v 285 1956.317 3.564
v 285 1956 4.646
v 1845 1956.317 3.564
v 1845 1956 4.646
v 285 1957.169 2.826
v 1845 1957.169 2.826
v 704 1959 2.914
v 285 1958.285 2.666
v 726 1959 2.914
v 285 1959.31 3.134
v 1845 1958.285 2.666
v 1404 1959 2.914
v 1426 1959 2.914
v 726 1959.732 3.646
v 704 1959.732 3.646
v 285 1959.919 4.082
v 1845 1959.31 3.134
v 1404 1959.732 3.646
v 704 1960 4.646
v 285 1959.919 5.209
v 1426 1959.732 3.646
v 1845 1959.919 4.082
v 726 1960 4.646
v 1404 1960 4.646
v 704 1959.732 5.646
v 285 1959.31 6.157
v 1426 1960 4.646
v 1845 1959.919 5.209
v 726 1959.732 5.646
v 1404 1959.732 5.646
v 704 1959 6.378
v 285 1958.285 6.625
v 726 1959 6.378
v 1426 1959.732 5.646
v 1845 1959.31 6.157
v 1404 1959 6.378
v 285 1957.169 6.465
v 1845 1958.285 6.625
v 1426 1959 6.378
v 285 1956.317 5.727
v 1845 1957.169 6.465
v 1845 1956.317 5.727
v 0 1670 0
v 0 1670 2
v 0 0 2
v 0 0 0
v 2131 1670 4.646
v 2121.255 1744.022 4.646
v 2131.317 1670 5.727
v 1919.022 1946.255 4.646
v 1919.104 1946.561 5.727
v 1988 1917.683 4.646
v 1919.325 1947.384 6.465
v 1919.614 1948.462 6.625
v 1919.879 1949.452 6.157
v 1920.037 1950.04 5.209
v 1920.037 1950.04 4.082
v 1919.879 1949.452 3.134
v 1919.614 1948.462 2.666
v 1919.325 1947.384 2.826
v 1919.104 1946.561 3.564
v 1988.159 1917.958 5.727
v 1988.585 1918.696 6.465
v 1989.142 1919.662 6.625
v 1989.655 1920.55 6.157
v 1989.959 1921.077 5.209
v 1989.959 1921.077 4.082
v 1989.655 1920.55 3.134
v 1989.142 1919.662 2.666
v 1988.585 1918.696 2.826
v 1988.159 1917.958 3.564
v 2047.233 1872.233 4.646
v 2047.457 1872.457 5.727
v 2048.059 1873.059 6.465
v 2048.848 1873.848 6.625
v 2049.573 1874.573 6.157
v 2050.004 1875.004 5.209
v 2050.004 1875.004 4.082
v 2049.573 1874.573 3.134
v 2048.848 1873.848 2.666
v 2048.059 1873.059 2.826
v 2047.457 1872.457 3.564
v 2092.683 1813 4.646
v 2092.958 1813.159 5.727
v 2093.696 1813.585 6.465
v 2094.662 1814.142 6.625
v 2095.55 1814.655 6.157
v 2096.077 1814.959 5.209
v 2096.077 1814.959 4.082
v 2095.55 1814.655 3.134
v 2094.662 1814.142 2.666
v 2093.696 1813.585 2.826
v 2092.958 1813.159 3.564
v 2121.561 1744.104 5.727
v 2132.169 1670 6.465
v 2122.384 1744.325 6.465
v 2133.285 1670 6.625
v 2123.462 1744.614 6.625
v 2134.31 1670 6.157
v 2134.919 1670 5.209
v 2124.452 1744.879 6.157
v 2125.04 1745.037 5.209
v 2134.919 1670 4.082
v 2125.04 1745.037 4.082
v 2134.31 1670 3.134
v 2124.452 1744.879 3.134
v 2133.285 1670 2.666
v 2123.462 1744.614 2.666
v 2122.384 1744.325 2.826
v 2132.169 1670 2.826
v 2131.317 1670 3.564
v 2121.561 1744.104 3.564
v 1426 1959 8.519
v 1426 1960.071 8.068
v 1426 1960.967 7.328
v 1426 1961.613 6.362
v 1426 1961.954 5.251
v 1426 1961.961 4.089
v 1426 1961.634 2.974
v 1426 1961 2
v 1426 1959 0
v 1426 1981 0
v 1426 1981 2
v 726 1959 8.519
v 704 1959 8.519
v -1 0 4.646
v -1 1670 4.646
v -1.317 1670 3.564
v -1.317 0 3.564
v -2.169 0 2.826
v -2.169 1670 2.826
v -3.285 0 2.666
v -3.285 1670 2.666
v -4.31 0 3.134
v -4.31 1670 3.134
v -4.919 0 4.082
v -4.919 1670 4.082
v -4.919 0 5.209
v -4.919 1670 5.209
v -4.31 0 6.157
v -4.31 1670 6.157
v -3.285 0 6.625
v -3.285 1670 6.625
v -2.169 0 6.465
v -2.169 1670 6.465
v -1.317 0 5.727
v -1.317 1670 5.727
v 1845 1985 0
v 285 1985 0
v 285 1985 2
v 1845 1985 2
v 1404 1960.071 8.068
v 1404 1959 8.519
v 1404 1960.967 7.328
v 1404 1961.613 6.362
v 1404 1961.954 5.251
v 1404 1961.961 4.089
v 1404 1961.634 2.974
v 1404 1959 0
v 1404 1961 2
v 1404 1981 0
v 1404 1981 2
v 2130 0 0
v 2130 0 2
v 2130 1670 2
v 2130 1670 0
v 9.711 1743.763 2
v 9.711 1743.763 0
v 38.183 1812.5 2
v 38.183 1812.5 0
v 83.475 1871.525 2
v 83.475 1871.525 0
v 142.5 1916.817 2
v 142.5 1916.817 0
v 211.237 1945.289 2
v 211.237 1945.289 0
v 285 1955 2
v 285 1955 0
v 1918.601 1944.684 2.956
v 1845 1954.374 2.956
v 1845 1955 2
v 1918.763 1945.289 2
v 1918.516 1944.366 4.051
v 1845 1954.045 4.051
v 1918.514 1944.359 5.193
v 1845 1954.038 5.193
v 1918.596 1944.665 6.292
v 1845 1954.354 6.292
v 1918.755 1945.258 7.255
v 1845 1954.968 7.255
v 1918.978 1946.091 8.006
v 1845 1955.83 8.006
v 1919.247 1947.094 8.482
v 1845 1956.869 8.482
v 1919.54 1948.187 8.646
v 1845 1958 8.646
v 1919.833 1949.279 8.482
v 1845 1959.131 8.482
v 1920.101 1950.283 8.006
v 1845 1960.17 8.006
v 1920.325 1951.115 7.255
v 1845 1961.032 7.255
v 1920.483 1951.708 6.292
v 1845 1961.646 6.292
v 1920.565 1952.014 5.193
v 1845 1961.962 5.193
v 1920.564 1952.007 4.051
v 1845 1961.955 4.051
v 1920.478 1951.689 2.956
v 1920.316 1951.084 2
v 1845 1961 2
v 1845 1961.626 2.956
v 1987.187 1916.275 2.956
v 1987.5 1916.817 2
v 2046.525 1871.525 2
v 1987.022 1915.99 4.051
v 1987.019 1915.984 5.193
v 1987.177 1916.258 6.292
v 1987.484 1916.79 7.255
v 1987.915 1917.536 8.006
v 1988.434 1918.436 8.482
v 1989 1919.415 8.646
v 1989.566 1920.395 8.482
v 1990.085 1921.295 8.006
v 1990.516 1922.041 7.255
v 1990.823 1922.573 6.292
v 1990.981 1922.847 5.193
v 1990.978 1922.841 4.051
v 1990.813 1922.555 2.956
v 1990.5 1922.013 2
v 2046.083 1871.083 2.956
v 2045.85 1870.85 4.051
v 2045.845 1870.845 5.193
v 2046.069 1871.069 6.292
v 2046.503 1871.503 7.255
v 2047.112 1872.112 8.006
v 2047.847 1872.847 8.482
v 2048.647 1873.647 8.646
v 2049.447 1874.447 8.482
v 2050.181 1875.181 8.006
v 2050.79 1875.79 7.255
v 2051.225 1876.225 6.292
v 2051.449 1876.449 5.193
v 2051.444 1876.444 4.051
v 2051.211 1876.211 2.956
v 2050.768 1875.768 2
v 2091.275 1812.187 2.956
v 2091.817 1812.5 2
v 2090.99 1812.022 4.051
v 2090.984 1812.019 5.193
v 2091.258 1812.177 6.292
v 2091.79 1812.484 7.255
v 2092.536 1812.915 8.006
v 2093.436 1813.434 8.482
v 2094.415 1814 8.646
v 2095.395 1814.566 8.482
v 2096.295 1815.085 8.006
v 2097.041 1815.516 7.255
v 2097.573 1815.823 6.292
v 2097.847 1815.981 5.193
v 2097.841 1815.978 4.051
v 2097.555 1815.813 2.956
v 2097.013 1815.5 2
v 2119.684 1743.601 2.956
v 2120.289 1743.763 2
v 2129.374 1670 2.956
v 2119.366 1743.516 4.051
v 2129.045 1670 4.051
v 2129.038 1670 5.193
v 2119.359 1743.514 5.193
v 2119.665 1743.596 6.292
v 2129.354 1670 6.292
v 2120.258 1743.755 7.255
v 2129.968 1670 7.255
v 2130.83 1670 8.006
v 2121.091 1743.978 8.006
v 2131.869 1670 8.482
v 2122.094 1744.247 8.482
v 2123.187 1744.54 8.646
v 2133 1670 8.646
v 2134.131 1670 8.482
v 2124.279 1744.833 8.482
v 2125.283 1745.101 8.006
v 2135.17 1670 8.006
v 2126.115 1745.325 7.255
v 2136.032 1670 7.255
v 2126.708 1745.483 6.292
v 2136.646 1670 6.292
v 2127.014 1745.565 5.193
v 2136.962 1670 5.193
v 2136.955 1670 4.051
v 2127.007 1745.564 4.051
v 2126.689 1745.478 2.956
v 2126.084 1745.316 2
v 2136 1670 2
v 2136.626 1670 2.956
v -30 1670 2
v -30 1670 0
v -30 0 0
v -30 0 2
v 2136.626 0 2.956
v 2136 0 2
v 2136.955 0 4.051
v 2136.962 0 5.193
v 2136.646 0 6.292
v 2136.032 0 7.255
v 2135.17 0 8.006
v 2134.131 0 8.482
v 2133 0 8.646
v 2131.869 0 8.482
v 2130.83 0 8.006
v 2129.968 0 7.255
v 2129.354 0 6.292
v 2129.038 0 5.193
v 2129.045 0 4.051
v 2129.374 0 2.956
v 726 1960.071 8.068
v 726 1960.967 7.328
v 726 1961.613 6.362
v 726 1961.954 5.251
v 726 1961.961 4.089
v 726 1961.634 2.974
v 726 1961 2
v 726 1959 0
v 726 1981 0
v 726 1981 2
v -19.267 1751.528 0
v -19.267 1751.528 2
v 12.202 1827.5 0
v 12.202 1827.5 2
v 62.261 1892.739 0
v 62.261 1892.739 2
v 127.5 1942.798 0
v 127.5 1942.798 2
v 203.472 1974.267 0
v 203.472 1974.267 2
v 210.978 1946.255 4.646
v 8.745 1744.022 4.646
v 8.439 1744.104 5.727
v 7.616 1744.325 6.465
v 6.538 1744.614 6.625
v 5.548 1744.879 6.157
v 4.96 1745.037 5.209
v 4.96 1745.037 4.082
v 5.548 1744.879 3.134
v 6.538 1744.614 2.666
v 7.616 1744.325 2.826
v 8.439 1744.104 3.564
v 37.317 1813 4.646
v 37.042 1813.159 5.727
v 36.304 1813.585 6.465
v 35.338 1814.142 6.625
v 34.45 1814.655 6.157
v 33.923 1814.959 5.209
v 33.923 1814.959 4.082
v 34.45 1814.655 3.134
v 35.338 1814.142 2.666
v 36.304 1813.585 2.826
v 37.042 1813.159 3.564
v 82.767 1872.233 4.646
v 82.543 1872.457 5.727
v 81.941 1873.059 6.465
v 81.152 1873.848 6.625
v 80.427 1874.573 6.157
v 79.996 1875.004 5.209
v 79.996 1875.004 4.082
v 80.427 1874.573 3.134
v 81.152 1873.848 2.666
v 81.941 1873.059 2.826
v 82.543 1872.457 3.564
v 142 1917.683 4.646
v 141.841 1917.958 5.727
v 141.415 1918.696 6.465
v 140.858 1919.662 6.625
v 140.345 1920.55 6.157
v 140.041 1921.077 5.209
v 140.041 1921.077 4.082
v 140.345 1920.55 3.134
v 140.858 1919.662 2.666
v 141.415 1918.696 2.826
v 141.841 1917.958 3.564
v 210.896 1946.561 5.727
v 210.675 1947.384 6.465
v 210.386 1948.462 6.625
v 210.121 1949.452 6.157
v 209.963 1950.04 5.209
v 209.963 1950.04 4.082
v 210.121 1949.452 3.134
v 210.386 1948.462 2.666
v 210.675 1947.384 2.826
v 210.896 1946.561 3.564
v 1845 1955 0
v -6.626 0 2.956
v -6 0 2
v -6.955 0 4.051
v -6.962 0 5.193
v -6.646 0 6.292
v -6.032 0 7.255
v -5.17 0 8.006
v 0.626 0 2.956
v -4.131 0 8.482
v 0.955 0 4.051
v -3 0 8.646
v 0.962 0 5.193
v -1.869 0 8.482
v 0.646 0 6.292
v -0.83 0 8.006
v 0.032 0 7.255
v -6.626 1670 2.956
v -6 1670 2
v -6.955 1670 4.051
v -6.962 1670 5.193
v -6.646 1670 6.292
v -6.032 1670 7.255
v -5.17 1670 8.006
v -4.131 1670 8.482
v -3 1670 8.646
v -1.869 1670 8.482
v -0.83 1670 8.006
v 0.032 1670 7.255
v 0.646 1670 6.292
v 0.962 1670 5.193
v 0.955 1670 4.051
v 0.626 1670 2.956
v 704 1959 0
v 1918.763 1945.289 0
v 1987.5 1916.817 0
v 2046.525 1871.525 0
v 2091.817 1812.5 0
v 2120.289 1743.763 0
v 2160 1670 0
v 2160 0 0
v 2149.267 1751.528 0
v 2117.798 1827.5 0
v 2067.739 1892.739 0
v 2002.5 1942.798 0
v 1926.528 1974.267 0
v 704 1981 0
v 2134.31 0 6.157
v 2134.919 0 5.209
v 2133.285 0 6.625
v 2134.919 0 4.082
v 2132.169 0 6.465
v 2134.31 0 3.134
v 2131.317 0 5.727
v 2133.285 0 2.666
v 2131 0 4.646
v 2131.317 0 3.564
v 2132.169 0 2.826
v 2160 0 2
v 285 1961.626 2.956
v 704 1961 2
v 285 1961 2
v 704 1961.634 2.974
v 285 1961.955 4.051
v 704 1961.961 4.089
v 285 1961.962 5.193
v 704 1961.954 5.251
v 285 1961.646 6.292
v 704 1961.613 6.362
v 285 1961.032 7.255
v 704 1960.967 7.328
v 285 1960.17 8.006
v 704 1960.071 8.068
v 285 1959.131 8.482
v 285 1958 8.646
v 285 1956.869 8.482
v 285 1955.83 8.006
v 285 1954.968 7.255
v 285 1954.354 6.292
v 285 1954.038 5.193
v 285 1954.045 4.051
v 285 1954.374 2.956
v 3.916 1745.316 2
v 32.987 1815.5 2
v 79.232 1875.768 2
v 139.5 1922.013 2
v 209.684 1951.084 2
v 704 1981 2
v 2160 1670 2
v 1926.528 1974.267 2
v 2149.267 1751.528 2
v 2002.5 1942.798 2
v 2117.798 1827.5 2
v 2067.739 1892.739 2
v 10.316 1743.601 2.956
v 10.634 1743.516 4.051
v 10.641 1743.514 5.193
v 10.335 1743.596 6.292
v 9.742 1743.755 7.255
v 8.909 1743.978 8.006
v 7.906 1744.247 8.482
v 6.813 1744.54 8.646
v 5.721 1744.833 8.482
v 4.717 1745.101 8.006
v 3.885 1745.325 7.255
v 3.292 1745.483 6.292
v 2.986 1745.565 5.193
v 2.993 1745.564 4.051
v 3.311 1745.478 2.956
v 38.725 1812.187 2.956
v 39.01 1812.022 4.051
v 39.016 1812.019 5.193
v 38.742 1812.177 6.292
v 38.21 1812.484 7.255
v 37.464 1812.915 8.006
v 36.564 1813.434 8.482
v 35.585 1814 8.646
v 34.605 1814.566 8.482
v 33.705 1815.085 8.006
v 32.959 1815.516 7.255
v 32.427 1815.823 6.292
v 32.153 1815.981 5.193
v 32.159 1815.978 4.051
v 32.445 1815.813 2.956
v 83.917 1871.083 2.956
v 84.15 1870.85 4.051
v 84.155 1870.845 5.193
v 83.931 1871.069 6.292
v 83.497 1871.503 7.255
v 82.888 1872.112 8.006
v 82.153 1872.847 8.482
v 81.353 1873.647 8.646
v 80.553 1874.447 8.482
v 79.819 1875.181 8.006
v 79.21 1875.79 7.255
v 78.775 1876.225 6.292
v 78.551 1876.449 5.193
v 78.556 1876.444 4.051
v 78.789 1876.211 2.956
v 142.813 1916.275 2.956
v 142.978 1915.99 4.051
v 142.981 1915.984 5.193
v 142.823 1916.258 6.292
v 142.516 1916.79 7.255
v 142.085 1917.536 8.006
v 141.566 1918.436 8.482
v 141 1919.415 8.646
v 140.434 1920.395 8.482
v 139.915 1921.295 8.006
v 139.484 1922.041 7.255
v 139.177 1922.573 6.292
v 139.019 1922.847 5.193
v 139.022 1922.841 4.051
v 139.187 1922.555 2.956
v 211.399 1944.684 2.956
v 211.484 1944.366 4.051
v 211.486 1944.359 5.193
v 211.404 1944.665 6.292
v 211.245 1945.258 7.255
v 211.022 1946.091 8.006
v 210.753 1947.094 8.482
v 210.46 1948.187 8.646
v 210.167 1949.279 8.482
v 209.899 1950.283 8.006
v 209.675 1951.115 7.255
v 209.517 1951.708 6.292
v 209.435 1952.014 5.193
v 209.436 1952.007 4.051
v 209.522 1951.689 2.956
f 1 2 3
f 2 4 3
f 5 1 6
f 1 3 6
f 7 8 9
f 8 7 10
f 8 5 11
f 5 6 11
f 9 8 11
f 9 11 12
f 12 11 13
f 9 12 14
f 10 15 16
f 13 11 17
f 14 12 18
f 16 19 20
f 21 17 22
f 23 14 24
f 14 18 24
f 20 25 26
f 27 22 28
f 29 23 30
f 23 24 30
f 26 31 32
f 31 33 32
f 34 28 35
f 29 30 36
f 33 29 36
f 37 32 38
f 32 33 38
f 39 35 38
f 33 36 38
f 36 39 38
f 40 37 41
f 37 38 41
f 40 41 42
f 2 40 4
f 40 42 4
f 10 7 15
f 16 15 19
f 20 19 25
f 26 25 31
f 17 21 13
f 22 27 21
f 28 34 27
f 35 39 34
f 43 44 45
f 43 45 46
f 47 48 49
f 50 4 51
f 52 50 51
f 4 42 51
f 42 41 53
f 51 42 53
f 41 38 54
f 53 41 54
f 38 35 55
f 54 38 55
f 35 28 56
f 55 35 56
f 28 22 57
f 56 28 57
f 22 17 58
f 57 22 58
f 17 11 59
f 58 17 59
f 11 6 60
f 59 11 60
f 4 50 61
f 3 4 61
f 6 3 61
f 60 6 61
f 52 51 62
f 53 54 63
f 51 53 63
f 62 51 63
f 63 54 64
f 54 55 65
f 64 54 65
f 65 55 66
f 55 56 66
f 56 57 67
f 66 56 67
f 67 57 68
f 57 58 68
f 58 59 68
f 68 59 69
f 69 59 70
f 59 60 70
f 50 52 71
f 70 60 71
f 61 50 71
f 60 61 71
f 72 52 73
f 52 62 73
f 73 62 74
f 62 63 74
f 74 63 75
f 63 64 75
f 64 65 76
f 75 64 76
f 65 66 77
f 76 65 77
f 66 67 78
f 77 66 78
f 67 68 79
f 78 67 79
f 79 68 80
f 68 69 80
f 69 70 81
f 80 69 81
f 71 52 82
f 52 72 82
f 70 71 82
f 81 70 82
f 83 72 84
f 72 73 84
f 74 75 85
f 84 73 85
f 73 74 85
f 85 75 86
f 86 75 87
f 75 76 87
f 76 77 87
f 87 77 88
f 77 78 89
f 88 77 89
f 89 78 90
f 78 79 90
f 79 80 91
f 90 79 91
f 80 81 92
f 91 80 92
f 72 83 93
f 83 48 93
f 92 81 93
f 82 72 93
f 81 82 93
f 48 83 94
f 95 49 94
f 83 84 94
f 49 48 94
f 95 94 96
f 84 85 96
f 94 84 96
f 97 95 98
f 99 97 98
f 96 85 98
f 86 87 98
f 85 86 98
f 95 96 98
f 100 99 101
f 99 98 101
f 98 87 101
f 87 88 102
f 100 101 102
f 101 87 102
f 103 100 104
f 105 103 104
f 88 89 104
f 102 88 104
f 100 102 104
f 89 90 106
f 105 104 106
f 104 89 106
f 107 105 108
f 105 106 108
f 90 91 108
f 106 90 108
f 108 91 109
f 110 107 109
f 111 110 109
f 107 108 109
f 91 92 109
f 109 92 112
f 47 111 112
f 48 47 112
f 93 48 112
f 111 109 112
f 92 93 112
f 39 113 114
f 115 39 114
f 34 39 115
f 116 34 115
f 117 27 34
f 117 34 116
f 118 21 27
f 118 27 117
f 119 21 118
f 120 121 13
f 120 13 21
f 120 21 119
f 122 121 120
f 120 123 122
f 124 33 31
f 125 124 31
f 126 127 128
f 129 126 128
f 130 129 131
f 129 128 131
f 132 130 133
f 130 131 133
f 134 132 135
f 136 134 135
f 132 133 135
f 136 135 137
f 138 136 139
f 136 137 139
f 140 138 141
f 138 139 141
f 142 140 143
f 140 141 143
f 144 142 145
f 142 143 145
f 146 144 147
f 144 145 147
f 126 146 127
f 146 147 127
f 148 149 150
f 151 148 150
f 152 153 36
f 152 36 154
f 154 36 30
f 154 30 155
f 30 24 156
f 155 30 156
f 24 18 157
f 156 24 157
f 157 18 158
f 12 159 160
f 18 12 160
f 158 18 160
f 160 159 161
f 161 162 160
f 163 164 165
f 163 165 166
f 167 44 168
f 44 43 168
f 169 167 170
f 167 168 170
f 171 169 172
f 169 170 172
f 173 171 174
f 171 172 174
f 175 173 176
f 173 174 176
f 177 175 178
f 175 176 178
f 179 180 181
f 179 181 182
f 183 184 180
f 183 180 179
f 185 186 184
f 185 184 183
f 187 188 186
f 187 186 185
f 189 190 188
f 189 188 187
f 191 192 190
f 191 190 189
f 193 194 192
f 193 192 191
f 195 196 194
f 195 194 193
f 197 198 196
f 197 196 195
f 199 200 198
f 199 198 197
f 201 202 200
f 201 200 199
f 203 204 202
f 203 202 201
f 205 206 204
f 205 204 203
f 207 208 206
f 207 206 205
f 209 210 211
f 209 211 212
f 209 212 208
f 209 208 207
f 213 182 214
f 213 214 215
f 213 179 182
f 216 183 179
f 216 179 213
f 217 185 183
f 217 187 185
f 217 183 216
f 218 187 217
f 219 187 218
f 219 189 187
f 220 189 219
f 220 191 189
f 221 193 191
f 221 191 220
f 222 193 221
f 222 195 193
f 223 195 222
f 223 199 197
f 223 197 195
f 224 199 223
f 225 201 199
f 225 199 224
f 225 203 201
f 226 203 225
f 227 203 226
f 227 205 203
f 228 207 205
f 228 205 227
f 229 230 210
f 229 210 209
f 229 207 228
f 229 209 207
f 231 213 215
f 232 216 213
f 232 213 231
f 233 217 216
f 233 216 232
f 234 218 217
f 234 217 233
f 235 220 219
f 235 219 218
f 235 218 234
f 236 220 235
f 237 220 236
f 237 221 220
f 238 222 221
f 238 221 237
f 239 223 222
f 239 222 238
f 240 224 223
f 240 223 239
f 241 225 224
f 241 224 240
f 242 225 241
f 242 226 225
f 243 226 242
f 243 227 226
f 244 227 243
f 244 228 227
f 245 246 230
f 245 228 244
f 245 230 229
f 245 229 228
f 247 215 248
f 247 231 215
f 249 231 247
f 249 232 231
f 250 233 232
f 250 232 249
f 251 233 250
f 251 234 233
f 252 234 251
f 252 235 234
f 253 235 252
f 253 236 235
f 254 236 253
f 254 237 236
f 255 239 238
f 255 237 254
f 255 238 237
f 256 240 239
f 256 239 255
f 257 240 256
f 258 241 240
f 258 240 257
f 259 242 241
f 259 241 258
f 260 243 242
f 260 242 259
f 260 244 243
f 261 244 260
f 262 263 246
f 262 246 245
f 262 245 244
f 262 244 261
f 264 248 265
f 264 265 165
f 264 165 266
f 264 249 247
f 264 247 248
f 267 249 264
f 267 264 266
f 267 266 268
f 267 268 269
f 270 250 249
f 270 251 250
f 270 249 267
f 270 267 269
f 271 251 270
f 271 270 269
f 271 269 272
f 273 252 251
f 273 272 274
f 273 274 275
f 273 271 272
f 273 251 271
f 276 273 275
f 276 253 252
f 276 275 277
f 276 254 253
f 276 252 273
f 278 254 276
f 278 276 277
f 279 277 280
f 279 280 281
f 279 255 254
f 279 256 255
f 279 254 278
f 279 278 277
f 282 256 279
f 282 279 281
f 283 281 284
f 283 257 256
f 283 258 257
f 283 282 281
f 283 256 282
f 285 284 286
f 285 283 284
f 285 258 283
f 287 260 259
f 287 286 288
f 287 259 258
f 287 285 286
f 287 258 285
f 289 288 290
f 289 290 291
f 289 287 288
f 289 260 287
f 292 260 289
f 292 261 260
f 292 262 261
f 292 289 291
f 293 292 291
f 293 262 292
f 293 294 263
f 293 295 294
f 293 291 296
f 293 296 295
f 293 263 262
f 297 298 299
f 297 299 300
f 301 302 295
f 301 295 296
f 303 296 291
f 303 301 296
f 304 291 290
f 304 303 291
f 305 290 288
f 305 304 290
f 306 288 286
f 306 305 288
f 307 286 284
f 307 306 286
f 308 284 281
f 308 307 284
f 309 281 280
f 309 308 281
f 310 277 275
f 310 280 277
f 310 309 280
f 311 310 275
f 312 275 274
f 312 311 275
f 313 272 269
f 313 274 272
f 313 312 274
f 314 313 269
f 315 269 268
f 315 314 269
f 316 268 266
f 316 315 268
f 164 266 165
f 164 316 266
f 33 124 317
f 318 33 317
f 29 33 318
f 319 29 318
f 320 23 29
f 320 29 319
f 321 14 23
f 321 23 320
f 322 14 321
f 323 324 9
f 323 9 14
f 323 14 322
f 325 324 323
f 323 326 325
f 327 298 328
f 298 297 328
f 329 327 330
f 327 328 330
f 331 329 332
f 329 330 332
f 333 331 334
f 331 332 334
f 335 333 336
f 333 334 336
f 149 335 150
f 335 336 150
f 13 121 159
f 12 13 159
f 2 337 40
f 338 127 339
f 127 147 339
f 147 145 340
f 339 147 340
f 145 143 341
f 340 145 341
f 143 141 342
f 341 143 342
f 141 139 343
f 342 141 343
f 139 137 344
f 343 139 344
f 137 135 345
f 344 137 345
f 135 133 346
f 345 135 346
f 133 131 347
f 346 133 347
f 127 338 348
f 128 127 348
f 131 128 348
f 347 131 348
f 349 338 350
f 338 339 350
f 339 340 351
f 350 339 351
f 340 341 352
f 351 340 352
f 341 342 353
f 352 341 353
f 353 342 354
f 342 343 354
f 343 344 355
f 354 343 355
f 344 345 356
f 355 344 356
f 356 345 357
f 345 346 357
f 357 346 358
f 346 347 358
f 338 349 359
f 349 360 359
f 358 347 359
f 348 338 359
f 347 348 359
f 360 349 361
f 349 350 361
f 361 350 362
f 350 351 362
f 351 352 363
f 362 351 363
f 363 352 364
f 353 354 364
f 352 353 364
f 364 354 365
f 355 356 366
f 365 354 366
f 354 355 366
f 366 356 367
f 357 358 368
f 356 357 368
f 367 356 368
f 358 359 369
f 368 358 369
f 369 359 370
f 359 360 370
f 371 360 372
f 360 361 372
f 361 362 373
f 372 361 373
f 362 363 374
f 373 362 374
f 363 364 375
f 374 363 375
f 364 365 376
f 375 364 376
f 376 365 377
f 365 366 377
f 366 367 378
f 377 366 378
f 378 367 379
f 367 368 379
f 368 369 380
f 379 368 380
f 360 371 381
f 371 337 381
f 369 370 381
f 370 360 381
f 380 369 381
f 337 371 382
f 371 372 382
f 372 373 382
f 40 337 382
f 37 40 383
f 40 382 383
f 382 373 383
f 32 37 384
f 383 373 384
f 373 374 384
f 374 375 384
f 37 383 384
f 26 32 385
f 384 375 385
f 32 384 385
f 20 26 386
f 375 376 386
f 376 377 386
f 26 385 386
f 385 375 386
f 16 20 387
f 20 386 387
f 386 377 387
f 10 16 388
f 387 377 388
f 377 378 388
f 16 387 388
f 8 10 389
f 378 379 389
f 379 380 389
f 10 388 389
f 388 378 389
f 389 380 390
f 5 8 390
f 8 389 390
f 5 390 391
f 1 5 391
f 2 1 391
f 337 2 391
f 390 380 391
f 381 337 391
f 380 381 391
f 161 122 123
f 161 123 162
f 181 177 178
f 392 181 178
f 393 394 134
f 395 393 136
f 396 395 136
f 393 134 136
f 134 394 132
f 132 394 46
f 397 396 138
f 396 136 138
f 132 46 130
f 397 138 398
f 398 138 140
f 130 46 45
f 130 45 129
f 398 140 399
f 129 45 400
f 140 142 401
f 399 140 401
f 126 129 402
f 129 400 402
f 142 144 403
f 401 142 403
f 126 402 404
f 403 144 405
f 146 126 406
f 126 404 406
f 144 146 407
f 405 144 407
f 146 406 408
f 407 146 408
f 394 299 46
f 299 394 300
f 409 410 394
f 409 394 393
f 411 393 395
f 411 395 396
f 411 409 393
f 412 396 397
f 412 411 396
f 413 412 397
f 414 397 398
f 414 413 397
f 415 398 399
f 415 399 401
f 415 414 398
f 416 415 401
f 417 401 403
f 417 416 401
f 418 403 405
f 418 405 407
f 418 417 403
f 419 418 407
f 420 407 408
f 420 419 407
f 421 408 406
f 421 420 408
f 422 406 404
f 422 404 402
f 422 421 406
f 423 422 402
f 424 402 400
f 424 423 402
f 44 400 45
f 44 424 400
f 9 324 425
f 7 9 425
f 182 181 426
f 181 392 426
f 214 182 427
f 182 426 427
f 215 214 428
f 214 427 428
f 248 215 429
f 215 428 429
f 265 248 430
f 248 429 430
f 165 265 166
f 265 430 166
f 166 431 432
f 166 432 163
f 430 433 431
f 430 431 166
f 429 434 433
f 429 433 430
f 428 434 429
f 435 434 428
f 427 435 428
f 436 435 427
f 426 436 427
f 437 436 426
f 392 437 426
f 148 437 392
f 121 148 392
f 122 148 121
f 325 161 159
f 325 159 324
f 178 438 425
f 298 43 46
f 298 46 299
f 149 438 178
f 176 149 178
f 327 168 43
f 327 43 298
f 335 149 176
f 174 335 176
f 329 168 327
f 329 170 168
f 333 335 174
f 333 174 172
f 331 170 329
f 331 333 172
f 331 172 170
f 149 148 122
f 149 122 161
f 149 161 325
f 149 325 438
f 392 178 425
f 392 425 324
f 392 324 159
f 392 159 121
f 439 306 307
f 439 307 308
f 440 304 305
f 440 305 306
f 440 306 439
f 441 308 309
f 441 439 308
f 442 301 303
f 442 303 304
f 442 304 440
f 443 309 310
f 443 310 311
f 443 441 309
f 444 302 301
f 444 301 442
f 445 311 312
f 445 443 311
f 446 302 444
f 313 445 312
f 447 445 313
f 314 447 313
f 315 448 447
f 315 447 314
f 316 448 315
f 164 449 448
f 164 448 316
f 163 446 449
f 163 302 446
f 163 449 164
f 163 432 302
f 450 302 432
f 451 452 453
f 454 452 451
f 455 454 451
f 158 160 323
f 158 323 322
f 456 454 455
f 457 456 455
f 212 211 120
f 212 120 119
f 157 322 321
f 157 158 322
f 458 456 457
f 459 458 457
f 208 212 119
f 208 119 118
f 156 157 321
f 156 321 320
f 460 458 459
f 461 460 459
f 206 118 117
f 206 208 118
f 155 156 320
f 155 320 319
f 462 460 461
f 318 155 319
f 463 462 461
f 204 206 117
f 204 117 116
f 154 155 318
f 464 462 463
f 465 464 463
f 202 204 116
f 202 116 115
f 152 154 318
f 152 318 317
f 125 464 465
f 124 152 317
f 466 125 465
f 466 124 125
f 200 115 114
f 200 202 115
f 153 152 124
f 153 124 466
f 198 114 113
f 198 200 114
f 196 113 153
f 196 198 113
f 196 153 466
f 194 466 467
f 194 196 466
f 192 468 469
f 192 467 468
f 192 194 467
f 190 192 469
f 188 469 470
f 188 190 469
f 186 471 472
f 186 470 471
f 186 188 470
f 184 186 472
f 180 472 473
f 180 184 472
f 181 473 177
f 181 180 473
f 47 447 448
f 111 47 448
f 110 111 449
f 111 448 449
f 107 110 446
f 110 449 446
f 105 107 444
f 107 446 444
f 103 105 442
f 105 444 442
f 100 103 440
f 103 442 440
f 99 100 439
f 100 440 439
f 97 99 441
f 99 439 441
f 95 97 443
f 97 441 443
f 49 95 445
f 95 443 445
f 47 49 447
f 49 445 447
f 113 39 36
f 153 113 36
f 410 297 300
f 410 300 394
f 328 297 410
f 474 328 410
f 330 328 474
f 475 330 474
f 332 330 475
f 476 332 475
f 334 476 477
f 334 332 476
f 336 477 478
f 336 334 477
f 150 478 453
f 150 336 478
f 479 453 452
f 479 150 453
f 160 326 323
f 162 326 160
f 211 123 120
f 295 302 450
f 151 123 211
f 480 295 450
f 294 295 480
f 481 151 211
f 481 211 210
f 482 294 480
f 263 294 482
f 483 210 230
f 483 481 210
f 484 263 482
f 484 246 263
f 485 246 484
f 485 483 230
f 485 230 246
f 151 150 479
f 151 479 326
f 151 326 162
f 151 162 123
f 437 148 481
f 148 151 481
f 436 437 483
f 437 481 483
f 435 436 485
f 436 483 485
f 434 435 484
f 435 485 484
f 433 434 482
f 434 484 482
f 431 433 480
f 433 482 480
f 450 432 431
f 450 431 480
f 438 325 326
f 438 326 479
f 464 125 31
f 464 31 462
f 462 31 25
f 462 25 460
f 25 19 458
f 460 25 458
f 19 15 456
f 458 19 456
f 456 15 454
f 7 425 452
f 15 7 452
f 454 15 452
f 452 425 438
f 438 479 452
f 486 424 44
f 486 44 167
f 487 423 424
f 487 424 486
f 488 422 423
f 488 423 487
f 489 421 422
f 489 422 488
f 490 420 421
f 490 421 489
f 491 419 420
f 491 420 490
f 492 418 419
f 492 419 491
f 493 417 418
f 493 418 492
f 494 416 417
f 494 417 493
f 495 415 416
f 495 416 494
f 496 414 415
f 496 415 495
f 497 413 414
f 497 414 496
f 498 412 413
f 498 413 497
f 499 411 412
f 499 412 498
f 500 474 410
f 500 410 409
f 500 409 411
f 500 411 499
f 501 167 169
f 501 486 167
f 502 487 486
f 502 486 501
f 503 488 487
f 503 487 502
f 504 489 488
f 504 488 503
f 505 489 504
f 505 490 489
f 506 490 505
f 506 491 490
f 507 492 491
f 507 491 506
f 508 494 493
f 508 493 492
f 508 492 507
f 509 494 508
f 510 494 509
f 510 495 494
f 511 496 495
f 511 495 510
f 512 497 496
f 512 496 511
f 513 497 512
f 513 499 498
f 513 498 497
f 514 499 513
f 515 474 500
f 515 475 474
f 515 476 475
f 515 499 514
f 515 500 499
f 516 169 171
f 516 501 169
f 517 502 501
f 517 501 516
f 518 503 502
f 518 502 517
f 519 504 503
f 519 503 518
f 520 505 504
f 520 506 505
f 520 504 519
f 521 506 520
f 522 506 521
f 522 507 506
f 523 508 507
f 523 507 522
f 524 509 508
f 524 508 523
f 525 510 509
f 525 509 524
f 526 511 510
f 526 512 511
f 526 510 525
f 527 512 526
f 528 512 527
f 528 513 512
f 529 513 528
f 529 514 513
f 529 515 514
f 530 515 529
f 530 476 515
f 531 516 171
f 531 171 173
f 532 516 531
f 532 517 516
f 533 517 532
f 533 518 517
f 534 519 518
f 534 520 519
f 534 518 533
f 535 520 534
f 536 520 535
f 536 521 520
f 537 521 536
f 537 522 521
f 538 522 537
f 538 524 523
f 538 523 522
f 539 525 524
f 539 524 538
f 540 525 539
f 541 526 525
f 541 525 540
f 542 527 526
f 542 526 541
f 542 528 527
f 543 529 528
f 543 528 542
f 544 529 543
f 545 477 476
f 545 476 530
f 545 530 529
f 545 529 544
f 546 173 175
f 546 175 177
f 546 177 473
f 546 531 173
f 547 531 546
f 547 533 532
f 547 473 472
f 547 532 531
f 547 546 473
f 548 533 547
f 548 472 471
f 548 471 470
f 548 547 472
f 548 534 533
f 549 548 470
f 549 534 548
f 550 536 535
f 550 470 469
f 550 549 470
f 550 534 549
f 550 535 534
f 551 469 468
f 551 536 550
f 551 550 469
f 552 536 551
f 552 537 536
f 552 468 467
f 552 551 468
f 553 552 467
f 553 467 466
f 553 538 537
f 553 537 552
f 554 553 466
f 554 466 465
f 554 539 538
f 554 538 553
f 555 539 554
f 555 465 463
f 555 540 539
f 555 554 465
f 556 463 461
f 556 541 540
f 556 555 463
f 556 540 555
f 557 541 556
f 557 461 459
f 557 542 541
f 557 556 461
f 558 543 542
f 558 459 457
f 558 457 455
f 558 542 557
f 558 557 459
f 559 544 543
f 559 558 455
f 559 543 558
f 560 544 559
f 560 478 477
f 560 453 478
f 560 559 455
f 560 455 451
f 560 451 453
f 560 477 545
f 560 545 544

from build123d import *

# Parameters (mm, degrees)
SKETCH2_R          = 2
SKETCH3_W          = 22
SKETCH3_H          = 22
CUT_EXTRUDE1_DEPTH = 2934.581386125


with BuildPart() as part:
    # Sweep1: sweep along a path in Sketch1
    with BuildLine(Plane.XY) as sweep1_path:
        Line((0, 0), (0, 1670))
        ThreePointArc((0, 1670), (83.474567362, 1871.525432638), (285, 1955))
        Line((285, 1955), (1845, 1955))
        ThreePointArc((1845, 1955), (2046.525432638, 1871.525432638), (2130, 1670))
        Line((2130, 1670), (2130, 0))
    # Sketch2 → Sweep1 (sweep)
    with BuildSketch(Plane(origin=(0, 0, 0), x_dir=(1, 0, 0), z_dir=(0, 1, 0))):
        with BuildLine():
            Line((0, 0), (0, -2))
            ThreePointArc((0, -2), (-3, -8.645751311), (-6, -2))
            Line((-6, -2), (-30, -2))
            Line((-30, -2), (-30, 0))
            Line((-30, 0), (0, 0))
        make_face()
        with Locations((-3, -4.645751311)):
            Circle(SKETCH2_R, mode=Mode.SUBTRACT)
    sweep(path=sweep1_path.line)

    # Sketch3 → Cut-Extrude1 (cut, through all)
    with BuildSketch(Plane(origin=(0, 0, 0), x_dir=(-1, 0, 0), z_dir=(0, 0, -1))):
        with Locations((-1415, 1970)):
            Rectangle(SKETCH3_W, SKETCH3_H)
        with Locations((-715, 1970)):
            Rectangle(SKETCH3_W, SKETCH3_H)
    extrude(amount=-CUT_EXTRUDE1_DEPTH, mode=Mode.SUBTRACT)


solid = part.part
